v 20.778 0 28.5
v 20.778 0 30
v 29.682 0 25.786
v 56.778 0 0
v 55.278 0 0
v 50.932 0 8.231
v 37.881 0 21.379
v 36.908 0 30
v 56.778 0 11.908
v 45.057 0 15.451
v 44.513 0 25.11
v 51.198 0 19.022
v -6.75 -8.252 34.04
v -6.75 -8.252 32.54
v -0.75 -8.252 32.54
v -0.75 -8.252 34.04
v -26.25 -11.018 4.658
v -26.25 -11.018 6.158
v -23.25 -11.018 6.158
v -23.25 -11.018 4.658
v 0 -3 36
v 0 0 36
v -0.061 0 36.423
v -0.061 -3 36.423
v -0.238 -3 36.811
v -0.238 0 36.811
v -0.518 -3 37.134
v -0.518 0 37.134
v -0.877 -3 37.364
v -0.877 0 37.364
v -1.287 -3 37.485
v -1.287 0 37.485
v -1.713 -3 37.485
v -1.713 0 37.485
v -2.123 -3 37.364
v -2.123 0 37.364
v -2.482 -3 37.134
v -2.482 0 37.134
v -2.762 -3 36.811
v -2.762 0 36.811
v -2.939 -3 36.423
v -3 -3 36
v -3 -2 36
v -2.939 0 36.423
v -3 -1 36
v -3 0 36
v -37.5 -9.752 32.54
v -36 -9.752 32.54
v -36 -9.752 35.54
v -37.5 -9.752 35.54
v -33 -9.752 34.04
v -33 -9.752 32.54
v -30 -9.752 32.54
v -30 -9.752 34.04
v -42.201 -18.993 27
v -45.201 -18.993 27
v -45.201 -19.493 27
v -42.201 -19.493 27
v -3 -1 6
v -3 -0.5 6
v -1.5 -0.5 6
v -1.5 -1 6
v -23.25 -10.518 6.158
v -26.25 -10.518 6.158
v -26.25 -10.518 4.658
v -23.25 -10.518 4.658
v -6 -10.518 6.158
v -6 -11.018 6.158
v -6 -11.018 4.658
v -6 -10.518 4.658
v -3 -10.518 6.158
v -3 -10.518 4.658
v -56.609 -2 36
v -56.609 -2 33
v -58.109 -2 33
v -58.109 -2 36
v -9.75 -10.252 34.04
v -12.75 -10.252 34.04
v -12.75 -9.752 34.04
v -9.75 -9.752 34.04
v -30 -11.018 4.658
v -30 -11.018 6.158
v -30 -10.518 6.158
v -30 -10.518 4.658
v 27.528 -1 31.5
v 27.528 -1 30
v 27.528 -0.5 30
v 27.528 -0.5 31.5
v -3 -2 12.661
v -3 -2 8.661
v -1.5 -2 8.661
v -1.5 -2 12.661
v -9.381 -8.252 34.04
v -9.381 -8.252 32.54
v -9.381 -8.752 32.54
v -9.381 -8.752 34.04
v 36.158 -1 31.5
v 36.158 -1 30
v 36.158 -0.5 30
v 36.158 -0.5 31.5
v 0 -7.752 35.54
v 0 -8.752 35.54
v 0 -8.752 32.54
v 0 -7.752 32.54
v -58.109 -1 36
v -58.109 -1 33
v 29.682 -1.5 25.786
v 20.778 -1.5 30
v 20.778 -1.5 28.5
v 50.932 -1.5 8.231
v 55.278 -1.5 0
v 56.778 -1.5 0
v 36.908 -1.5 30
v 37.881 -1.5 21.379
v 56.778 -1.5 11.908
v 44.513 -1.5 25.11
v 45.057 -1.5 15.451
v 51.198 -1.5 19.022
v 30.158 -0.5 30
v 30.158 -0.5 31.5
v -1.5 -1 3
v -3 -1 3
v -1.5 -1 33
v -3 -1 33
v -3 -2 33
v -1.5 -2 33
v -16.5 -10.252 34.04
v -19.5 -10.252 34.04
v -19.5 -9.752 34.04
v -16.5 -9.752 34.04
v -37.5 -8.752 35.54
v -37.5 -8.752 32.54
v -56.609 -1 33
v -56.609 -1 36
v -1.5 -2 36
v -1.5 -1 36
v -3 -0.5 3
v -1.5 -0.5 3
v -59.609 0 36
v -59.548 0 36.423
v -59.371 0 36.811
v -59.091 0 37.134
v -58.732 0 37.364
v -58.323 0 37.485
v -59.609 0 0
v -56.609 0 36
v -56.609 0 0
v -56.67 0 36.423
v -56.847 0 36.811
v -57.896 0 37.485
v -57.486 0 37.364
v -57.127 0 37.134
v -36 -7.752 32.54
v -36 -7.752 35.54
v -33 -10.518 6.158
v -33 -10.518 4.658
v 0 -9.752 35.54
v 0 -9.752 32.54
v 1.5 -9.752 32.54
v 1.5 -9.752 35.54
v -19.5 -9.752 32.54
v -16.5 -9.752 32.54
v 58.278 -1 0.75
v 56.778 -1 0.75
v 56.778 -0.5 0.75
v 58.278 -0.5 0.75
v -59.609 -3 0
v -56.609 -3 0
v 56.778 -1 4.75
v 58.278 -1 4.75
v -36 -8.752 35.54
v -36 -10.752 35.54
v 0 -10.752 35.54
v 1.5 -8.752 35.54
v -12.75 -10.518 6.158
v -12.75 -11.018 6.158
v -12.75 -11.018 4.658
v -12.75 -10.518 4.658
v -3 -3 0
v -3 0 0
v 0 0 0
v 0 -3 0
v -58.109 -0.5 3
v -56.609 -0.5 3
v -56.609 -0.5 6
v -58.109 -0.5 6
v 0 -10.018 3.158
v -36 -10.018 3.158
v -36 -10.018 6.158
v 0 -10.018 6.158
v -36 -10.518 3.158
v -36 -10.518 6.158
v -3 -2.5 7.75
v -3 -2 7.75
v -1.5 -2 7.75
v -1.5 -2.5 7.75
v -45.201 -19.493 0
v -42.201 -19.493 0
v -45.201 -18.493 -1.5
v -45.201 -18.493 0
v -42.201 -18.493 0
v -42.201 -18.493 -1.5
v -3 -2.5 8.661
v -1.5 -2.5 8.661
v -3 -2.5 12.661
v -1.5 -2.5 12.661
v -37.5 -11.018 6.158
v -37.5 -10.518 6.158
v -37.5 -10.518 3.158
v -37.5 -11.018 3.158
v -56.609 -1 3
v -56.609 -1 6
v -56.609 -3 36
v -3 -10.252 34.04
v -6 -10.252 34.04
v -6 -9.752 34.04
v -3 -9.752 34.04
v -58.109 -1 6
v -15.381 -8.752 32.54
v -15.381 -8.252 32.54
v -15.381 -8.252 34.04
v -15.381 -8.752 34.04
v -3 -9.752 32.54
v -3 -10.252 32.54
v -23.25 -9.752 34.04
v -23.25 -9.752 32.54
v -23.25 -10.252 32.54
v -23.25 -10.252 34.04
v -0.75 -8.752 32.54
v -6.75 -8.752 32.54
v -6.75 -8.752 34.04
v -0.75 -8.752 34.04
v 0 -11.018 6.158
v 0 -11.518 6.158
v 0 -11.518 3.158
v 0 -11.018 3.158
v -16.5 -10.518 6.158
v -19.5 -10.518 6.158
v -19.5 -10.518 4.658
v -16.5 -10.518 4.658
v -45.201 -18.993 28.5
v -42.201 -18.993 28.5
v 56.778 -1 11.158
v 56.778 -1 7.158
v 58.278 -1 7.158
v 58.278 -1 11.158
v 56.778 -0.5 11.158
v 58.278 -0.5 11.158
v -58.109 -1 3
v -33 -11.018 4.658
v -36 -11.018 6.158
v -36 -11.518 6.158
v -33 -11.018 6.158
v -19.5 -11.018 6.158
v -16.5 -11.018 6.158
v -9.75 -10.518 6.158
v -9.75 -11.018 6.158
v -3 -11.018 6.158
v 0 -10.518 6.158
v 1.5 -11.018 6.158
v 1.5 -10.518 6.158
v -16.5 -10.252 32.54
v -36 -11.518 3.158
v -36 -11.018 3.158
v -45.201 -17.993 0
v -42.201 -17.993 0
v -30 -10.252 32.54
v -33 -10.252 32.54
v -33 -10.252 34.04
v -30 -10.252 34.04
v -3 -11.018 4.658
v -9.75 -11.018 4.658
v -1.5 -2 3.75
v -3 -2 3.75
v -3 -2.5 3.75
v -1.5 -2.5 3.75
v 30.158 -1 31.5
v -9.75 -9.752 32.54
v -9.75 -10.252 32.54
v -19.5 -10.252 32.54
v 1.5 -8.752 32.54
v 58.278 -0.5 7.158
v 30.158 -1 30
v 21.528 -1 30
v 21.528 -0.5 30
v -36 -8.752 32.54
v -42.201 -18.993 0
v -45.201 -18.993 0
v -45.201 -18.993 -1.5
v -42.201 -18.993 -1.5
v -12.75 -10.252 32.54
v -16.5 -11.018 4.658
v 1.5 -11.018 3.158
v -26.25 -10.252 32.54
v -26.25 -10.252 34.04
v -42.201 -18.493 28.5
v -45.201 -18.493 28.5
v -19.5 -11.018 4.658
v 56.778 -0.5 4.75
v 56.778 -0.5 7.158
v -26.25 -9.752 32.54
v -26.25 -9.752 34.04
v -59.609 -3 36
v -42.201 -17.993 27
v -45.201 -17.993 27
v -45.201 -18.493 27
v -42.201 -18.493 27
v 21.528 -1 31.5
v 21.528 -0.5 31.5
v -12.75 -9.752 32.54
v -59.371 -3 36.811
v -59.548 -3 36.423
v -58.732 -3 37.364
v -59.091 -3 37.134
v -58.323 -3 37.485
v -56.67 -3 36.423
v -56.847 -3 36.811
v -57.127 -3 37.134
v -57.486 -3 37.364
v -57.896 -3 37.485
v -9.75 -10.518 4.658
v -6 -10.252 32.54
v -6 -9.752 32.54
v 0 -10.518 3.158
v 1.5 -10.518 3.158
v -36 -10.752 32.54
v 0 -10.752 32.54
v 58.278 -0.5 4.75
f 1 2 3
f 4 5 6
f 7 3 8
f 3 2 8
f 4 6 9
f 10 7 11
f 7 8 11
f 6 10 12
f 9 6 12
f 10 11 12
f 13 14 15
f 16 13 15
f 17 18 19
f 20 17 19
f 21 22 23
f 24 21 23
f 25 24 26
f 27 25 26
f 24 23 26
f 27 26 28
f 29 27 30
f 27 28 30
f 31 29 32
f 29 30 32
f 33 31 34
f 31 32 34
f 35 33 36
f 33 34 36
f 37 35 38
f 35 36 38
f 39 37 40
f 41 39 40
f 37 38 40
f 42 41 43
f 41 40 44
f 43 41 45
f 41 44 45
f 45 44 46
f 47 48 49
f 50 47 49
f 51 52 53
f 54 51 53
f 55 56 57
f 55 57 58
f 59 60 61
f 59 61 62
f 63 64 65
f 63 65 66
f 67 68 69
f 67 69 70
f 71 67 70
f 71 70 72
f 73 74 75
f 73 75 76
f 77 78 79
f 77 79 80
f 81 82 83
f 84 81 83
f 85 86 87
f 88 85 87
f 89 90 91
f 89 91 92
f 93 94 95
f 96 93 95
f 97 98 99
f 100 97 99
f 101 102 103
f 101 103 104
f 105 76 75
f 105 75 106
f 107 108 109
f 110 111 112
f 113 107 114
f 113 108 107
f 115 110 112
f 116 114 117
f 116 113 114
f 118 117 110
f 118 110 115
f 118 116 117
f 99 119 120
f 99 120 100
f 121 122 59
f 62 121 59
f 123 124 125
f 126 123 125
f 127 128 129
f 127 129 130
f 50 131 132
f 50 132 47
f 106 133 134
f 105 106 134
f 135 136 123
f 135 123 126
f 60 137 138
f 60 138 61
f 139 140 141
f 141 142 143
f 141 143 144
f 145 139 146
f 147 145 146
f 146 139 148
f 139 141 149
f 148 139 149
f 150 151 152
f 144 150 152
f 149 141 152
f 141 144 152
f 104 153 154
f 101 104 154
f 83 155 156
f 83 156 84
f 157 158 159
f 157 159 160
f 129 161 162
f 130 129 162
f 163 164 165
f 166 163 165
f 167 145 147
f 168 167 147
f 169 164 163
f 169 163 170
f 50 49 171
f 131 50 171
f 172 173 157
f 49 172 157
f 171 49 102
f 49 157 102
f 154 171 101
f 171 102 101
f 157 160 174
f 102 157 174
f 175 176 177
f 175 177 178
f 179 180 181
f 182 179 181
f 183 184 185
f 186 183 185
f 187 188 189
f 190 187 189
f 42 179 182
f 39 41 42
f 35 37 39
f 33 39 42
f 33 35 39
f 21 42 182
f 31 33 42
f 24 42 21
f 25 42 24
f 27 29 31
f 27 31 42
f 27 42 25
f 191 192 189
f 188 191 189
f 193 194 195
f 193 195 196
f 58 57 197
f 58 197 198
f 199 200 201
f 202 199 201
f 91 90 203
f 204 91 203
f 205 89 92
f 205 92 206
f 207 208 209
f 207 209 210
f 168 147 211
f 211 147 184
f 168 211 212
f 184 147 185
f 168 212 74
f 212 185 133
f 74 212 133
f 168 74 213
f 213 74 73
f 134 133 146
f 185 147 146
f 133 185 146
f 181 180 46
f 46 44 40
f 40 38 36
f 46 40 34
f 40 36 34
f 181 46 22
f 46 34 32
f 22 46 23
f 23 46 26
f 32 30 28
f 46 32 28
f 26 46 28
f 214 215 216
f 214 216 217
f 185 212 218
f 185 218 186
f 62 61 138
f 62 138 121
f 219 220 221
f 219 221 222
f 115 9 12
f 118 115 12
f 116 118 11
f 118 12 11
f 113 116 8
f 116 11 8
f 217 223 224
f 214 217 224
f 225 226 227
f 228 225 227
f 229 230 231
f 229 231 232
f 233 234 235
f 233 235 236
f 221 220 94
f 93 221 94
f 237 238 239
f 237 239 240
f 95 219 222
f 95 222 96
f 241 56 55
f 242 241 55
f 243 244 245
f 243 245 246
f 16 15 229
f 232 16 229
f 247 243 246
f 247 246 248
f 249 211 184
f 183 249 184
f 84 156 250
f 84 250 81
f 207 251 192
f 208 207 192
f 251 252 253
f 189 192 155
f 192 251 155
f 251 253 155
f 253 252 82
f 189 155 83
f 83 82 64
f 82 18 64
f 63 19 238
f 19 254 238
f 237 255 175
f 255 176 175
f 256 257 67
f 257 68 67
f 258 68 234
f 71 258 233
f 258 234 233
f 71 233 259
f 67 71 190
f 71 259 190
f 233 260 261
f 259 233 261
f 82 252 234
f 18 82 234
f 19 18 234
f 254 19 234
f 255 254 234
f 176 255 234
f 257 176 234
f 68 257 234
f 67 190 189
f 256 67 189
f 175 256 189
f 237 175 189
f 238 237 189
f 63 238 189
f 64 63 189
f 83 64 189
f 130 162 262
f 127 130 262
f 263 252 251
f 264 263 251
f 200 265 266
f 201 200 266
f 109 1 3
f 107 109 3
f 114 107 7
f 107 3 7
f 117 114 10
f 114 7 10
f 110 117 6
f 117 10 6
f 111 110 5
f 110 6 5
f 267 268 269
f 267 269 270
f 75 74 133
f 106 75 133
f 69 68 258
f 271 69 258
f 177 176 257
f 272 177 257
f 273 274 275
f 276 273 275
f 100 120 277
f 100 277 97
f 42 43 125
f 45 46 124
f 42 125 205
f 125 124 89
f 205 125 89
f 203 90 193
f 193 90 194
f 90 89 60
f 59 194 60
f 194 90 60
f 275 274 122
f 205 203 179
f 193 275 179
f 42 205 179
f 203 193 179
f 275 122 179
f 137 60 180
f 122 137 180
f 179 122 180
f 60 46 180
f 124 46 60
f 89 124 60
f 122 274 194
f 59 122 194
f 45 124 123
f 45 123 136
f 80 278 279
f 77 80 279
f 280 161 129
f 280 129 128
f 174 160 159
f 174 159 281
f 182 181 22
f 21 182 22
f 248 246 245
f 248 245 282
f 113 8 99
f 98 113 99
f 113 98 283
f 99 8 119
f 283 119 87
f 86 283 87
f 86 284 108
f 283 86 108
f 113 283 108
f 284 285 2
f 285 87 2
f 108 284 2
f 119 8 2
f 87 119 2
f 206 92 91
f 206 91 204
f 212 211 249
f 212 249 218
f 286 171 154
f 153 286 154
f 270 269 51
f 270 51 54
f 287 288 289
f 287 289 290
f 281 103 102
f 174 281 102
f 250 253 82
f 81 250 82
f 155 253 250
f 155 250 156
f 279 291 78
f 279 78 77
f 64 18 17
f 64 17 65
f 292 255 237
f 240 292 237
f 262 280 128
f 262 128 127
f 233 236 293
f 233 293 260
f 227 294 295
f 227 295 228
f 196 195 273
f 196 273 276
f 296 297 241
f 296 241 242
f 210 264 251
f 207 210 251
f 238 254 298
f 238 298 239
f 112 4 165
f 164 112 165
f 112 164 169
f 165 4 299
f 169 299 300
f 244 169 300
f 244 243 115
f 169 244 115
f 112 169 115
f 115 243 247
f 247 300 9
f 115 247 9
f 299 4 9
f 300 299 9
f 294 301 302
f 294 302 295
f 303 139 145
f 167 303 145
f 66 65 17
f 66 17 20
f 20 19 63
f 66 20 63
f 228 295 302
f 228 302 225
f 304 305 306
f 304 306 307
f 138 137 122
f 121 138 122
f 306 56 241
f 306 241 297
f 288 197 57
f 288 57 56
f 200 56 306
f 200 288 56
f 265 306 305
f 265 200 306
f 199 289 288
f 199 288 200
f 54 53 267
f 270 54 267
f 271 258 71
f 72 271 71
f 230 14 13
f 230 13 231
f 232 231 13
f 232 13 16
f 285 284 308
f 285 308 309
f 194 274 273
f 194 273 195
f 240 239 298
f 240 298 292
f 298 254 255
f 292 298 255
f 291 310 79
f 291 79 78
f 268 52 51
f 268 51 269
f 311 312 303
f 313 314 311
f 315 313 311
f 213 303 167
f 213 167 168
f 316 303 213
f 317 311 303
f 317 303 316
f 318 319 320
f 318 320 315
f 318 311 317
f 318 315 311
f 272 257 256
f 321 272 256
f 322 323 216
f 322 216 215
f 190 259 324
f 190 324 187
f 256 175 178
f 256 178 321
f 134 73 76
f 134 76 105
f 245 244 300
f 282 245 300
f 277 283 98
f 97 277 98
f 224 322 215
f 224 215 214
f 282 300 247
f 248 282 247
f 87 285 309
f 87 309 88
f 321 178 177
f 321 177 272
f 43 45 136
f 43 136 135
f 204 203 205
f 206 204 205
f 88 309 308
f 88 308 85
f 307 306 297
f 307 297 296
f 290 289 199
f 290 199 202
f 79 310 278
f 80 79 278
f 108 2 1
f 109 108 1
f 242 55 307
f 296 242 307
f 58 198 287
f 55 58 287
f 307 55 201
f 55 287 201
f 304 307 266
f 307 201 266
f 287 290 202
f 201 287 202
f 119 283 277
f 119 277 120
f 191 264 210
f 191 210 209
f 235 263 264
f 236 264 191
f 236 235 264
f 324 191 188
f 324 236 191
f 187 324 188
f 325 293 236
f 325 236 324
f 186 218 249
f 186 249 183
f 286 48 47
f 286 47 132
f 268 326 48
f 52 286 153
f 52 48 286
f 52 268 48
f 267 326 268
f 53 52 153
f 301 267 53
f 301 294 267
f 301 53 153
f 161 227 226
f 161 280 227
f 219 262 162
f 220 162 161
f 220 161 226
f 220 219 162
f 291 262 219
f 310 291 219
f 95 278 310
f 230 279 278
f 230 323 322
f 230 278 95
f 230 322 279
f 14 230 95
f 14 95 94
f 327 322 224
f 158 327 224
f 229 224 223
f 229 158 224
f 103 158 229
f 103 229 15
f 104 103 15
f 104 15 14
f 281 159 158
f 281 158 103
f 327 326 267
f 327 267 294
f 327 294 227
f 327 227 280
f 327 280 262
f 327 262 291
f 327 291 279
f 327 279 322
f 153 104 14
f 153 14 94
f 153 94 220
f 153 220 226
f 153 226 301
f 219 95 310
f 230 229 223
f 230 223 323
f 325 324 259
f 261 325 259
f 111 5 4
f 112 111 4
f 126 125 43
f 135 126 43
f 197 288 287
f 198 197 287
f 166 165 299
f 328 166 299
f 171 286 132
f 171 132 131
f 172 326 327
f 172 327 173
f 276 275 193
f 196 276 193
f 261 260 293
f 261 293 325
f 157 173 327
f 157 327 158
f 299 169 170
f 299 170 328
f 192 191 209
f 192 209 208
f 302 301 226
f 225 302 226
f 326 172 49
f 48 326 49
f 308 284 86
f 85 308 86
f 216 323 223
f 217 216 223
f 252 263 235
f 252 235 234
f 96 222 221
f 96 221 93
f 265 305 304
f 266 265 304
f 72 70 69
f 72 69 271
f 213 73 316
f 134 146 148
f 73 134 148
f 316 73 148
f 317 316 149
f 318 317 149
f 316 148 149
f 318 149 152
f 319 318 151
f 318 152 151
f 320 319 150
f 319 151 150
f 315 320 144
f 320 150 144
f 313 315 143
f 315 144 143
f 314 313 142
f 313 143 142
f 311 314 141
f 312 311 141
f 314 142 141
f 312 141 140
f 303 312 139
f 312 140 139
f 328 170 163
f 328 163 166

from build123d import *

# Parameters (mm, degrees)
F1_DEPTH  = 3
F2_W      = 1
F2_H      = 3
F3_DEPTH  = 1.5
F4_W      = 0.5
F4_H      = 3
F5_DEPTH  = 1.5
F6_W      = 1.5
F6_H      = 3
F7_DEPTH  = 36
F8_W      = 0.5
F8_H      = 3
F9_DEPTH  = 1.5
F10_W     = 0.5
F10_H     = 3
F11_DEPTH = 1.5
F12_W     = 3
F12_H     = 0.5
F13_DEPTH = 1.5
F14_W     = 3
F14_H     = 3
F15_DEPTH = 36
F16_W     = 1
F16_H     = 3
F17_DEPTH = 1.5
F18_W     = 1
F18_H     = 3
F19_DEPTH = 1.5
F20_W     = 3
F20_H     = 0.5
F21_DEPTH = 1.5
F23_DEPTH = 3
F24_W     = 1
F24_H     = 3
F25_DEPTH = 1.5
F26_W     = 0.5
F26_H     = 3
F27_DEPTH = 1.5
F28_W     = 3
F28_H     = 1.5
F29_DEPTH = 27
F30_W     = 3
F30_H     = 0.5
F31_DEPTH = 1.5
F32_W     = 3
F32_H     = 0.5
F33_DEPTH = 1.5
F35_DEPTH = 1.5
F36_W     = 6
F36_H     = 0.5
F37_DEPTH = 1.5
F38_W     = 0.5
F38_H     = 4
F39_DEPTH = 1.5
F40_W     = 0.5
F40_H     = 4
F41_DEPTH = 1.5
F42_W     = 6
F42_H     = 0.5
F43_DEPTH = 1.5


with BuildPart() as f1:
    # F0 (on Front) → F1 (new body)
    with BuildSketch(Plane.XZ):
        with BuildLine():
            Line((-3, 0), (0, 0))
            Line((0, 0), (0, 36))
            ThreePointArc((0, 36), (-1.5, 37.5), (-3, 36))
            Line((-3, 36), (-3, 0))
        make_face()
    extrude(amount=F1_DEPTH)

    # F2 (on face) → F3 (cut)
    with BuildSketch(Plane(origin=(-3, 0, 0), x_dir=(0, -1, 0), z_dir=(-1, 0, 0))):
        with Locations((1.5, 34.5)):
            Rectangle(F2_W, F2_H)
    extrude(amount=-F3_DEPTH, mode=Mode.SUBTRACT)

    # F4 (on face) → F5 (cut)
    with BuildSketch(Plane(origin=(-3, 0, 0), x_dir=(0, -1, 0), z_dir=(-1, 0, 0))):
        with Locations((0.75, 4.5)):
            Rectangle(F4_W, F4_H)
    extrude(amount=-F5_DEPTH, mode=Mode.SUBTRACT)

    # F40 (on face) → F41 (cut)
    with BuildSketch(Plane(origin=(-3, 0, 0), x_dir=(0, -1, 0), z_dir=(-1, 0, 0))):
        with Locations((2.25, 5.75)):
            Rectangle(F40_W, F40_H)
        with Locations((2.25, 10.661251)):
            Rectangle(F40_W, F40_H)
    extrude(amount=-F41_DEPTH, mode=Mode.SUBTRACT)


with BuildPart() as f7:
    # F6 (on Right) → F7 (new body)
    with BuildSketch(Plane.YZ):
        with Locations((-10.767935, 4.65786)):
            Rectangle(F6_W, F6_H)
    extrude(amount=-F7_DEPTH)

    # F8 (on face) → F9 (join)
    with BuildSketch(Plane(origin=(-36, 0, 0), x_dir=(0, -1, 0), z_dir=(-1, 0, 0))):
        with Locations((10.767935, 4.65786)):
            Rectangle(F8_W, F8_H)
    extrude(amount=F9_DEPTH)

    # F10 (on face) → F11 (join)
    with BuildSketch(Plane.YZ):
        with Locations((-10.7675, 4.65786)):
            Rectangle(F10_W, F10_H)
    extrude(amount=F11_DEPTH)

    # F12 (on face) → F13 (cut)
    with BuildSketch(Plane.XY.offset(6.15786)):
        with Locations((-31.5, -10.767935)):
            Rectangle(F12_W, F12_H)
        with Locations((-24.75, -10.767935)):
            Rectangle(F12_W, F12_H)
        with Locations((-18, -10.767935)):
            Rectangle(F12_W, F12_H)
        with Locations((-11.25, -10.767935)):
            Rectangle(F12_W, F12_H)
        with Locations((-4.5, -10.767935)):
            Rectangle(F12_W, F12_H)
    extrude(amount=-F13_DEPTH, mode=Mode.SUBTRACT)


with BuildPart() as f15:
    # F14 (on Right) → F15 (new body)
    with BuildSketch(Plane.YZ):
        with Locations((-9.252247, 34.040392)):
            Rectangle(F14_W, F14_H)
    extrude(amount=-F15_DEPTH)

    # F16 (on face) → F17 (join)
    with BuildSketch(Plane(origin=(-36, 0, 0), x_dir=(0, -1, 0), z_dir=(-1, 0, 0))):
        with Locations((9.252247, 34.040392)):
            Rectangle(F16_W, F16_H)
    extrude(amount=F17_DEPTH)

    # F18 (on face) → F19 (join)
    with BuildSketch(Plane.YZ):
        with Locations((-9.252247, 34.040392)):
            Rectangle(F18_W, F18_H)
    extrude(amount=F19_DEPTH)

    # F20 (on face) → F21 (cut)
    with BuildSketch(Plane(origin=(0, 0, 32.540392), x_dir=(1, 0, 0), z_dir=(0, 0, -1))):
        with Locations((-4.5, 10.002247)):
            Rectangle(F20_W, F20_H)
        with Locations((-11.25, 10.002247)):
            Rectangle(F20_W, F20_H)
        with Locations((-18, 10.002247)):
            Rectangle(F20_W, F20_H)
        with Locations((-24.75, 10.002247)):
            Rectangle(F20_W, F20_H)
        with Locations((-31.5, 10.002247)):
            Rectangle(F20_W, F20_H)
    extrude(amount=-F21_DEPTH, mode=Mode.SUBTRACT)

    # F42 (on face) → F43 (cut)
    with BuildSketch(Plane(origin=(0, 0, 32.540392), x_dir=(1, 0, 0), z_dir=(0, 0, -1))):
        with Locations((-3.75, 8.502247)):
            Rectangle(F42_W, F42_H)
        with Locations((-12.381, 8.502247)):
            Rectangle(F42_W, F42_H)
    extrude(amount=-F43_DEPTH, mode=Mode.SUBTRACT)


with BuildPart() as f23:
    # F22 (on Front) → F23 (new body)
    with BuildSketch(Plane.XZ):
        with BuildLine():
            Line((-59.609044, 36), (-59.609044, 0))
            Line((-59.609044, 0), (-56.609044, 0))
            Line((-56.609044, 0), (-56.609044, 36))
            ThreePointArc((-56.609044, 36), (-58.109044, 37.5), (-59.609044, 36))
        make_face()
    extrude(amount=F23_DEPTH)

    # F24 (on face) → F25 (cut)
    with BuildSketch(Plane.YZ.offset(-56.609044)):
        with Locations((-1.5, 34.5)):
            Rectangle(F24_W, F24_H)
    extrude(amount=-F25_DEPTH, mode=Mode.SUBTRACT)

    # F26 (on face) → F27 (cut)
    with BuildSketch(Plane.YZ.offset(-56.609044)):
        with Locations((-0.75, 4.5)):
            Rectangle(F26_W, F26_H)
    extrude(amount=-F27_DEPTH, mode=Mode.SUBTRACT)


with BuildPart() as f29:
    # F28 (on Top) → F29 (new body)
    with BuildSketch(Plane.XY):
        with Locations((-43.700521, -18.742762)):
            Rectangle(F28_W, F28_H)
    extrude(amount=F29_DEPTH)

    # F30 (on face) → F31 (join)
    with BuildSketch(Plane.XY.offset(27)):
        with Locations((-43.700521, -18.742762)):
            Rectangle(F30_W, F30_H)
    extrude(amount=F31_DEPTH)

    # F32 (on face) → F33 (join)
    with BuildSketch(Plane(origin=(0, 0, 0), x_dir=(1, 0, 0), z_dir=(0, 0, -1))):
        with Locations((-43.700521, 18.742762)):
            Rectangle(F32_W, F32_H)
    extrude(amount=F33_DEPTH)


with BuildPart() as f35:
    # F34 (on Front) → F35 (new body)
    with BuildSketch(Plane.XZ):
        with BuildLine():
            Line((36.908358, 30), (20.777803, 30))
            Line((20.777803, 30), (20.777803, 28.5))
            ThreePointArc((20.777803, 28.5), (41.614981, 18.592373), (55.277803, 0))
            Line((55.277803, 0), (56.777803, 0))
            Line((56.777803, 0), (56.777803, 11.907568))
            ThreePointArc((56.777803, 11.907568), (47.982971, 22.205633), (36.908358, 30))
        make_face()
    extrude(amount=F35_DEPTH)

    # F36 (on face) → F37 (join)
    with BuildSketch(Plane.XY.offset(30)):
        with Locations((24.527803, -0.75)):
            Rectangle(F36_W, F36_H)
        with Locations((33.158358, -0.75)):
            Rectangle(F36_W, F36_H)
    extrude(amount=F37_DEPTH)

    # F38 (on face) → F39 (join)
    with BuildSketch(Plane.YZ.offset(56.777803)):
        with Locations((-0.75, 2.75)):
            Rectangle(F38_W, F38_H)
        with Locations((-0.75, 9.157568)):
            Rectangle(F38_W, F38_H)
    extrude(amount=F39_DEPTH)


solid = Compound([f1.part, f7.part, f15.part, f23.part, f29.part, f35.part])
